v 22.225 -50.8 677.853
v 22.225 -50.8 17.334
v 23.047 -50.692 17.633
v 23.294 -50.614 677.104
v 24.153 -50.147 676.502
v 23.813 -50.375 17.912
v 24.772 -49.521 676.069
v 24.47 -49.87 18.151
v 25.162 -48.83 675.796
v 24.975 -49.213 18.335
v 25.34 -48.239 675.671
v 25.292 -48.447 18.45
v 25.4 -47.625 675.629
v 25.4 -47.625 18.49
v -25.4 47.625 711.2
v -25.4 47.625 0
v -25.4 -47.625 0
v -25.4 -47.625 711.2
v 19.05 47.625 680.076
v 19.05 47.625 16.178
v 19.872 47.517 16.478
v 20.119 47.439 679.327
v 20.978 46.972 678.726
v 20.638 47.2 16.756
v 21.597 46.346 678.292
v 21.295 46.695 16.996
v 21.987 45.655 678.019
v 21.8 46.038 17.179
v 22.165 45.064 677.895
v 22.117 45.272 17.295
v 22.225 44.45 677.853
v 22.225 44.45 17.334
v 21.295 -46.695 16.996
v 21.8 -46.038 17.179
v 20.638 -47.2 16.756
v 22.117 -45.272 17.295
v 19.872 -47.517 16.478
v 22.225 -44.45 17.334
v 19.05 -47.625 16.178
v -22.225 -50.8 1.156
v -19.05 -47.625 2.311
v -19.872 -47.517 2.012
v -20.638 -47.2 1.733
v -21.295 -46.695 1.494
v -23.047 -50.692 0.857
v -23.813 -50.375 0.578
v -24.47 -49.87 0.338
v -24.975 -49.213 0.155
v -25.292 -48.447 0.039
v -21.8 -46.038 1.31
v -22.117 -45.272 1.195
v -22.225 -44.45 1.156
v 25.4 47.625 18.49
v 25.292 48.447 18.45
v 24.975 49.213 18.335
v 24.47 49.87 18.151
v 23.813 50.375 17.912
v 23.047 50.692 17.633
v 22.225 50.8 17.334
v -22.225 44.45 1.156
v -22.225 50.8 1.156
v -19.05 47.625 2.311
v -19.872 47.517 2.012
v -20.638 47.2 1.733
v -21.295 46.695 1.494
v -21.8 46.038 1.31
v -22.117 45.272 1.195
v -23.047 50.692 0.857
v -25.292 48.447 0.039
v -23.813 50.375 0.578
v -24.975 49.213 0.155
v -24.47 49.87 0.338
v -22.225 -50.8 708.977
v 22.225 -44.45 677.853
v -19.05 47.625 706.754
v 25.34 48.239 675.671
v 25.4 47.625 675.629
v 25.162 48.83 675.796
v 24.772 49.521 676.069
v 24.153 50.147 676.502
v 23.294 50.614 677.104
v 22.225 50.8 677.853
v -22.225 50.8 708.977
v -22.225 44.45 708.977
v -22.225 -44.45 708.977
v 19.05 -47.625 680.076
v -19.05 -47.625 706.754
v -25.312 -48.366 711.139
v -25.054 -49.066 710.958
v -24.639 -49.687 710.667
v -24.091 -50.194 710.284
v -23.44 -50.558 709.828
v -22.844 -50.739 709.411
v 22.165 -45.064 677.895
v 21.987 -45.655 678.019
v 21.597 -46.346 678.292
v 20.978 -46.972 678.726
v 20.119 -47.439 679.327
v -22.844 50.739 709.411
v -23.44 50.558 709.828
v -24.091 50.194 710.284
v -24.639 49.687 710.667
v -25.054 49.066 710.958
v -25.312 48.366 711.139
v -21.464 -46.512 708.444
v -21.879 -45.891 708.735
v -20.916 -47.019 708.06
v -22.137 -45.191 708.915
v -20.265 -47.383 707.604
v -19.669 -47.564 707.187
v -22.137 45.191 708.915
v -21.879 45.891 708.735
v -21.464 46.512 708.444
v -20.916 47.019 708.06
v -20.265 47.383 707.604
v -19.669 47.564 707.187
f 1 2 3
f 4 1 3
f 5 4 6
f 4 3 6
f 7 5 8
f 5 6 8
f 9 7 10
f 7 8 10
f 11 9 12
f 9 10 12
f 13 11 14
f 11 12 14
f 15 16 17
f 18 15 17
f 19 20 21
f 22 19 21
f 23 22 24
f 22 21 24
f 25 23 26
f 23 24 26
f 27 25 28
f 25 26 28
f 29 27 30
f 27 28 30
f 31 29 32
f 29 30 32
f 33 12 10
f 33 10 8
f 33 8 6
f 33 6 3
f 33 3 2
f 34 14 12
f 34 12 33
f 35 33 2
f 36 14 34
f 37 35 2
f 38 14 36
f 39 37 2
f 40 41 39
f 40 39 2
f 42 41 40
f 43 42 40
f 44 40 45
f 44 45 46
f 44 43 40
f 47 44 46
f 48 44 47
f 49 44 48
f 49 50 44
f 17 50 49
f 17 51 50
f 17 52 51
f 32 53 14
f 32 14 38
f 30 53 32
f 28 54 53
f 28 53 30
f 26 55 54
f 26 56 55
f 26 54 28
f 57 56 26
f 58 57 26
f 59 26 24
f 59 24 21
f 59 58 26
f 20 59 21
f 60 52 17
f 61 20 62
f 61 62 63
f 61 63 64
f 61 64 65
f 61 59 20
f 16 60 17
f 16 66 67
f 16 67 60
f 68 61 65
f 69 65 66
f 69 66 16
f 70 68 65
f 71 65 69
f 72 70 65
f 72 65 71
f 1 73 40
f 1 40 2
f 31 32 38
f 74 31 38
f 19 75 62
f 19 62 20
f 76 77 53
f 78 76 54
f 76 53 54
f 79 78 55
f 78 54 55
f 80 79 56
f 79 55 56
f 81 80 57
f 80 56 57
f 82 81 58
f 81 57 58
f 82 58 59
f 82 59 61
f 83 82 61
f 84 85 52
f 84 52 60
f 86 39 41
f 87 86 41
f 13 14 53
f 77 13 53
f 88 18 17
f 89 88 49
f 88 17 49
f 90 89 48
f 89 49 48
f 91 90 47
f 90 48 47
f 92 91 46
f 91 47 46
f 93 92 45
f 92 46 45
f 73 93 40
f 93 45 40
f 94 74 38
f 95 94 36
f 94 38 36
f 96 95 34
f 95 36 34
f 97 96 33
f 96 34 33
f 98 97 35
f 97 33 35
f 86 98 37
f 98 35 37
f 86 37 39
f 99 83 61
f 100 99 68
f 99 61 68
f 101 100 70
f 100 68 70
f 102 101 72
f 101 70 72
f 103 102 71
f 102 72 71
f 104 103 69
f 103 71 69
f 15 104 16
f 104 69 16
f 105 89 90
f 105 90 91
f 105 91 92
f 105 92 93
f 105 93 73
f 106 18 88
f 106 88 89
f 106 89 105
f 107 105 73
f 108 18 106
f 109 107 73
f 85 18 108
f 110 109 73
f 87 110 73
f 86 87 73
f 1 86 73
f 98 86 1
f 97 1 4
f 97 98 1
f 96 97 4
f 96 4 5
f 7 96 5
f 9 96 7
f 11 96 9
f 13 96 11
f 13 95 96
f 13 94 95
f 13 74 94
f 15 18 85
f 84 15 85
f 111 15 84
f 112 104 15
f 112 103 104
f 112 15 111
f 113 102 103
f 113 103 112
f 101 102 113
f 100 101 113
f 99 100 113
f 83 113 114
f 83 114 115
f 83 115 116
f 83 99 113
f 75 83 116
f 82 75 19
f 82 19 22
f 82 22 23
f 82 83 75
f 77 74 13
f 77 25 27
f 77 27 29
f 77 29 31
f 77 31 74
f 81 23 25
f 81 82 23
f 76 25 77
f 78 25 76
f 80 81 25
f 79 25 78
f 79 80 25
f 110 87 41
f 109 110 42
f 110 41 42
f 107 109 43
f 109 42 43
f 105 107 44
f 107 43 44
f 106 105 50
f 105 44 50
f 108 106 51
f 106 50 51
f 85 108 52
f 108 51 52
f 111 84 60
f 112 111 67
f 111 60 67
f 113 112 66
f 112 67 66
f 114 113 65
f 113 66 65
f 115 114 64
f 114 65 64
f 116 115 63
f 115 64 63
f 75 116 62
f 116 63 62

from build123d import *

# Parameters (mm, degrees)
F1_DEPTH      = 711.2
F3_DEPTH      = 50.801
F3_DEPTH_BACK = 50.801
F5_DEPTH      = 50.801
F5_DEPTH_BACK = 50.801


with BuildPart() as f1:
    # F0 (on Top) → F1 (new body)
    with BuildSketch(Plane.XY):
        with BuildLine():
            Line((-22.225, -50.8), (22.225, -50.8))
            ThreePointArc((22.225, -50.8), (24.4700640303, -49.8700640303), (25.4, -47.625))
            Line((25.4, -47.625), (25.4, 47.625))
            ThreePointArc((25.4, 47.625), (24.4700640303, 49.8700640303), (22.225, 50.8))
            Line((22.225, 50.8), (-22.225, 50.8))
            ThreePointArc((-22.225, 50.8), (-24.4700640303, 49.8700640303), (-25.4, 47.625))
            Line((-25.4, 47.625), (-25.4, -47.625))
            ThreePointArc((-25.4, -47.625), (-24.4700640303, -49.8700640303), (-22.225, -50.8))
        make_face()
        with BuildLine():
            ThreePointArc((22.225, -44.45), (21.2950640303, -46.6950640303), (19.05, -47.625))
            Line((19.05, -47.625), (-19.05, -47.625))
            ThreePointArc((-19.05, -47.625), (-21.2950640303, -46.6950640303), (-22.225, -44.45))
            Line((-22.225, -44.45), (-22.225, 44.45))
            ThreePointArc((-22.225, 44.45), (-21.2950640303, 46.6950640303), (-19.05, 47.625))
            Line((-19.05, 47.625), (19.05, 47.625))
            ThreePointArc((19.05, 47.625), (21.2950640303, 46.6950640303), (22.225, 44.45))
            Line((22.225, 44.45), (22.225, -44.45))
        make_face(mode=Mode.SUBTRACT)
    extrude(amount=F1_DEPTH)

    # F2 (on Front) → F3 (cut, two sides)
    with BuildSketch(Plane.XZ) as f3_sk:
        Polygon((25.4, 18.4896879007), (-25.4, 0), (25.4, 0), align=None)
    extrude(amount=-F3_DEPTH, mode=Mode.SUBTRACT)
    extrude(f3_sk.sketch, amount=F3_DEPTH_BACK, mode=Mode.SUBTRACT)

    # F4 (on Front) → F5 (cut, two sides)
    with BuildSketch(Plane.XZ) as f5_sk:
        Polygon((25.4, 711.2), (-25.4, 711.2), (25.4, 675.6294570589), align=None)
    extrude(amount=-F5_DEPTH, mode=Mode.SUBTRACT)
    extrude(f5_sk.sketch, amount=F5_DEPTH_BACK, mode=Mode.SUBTRACT)


solid = f1.part
